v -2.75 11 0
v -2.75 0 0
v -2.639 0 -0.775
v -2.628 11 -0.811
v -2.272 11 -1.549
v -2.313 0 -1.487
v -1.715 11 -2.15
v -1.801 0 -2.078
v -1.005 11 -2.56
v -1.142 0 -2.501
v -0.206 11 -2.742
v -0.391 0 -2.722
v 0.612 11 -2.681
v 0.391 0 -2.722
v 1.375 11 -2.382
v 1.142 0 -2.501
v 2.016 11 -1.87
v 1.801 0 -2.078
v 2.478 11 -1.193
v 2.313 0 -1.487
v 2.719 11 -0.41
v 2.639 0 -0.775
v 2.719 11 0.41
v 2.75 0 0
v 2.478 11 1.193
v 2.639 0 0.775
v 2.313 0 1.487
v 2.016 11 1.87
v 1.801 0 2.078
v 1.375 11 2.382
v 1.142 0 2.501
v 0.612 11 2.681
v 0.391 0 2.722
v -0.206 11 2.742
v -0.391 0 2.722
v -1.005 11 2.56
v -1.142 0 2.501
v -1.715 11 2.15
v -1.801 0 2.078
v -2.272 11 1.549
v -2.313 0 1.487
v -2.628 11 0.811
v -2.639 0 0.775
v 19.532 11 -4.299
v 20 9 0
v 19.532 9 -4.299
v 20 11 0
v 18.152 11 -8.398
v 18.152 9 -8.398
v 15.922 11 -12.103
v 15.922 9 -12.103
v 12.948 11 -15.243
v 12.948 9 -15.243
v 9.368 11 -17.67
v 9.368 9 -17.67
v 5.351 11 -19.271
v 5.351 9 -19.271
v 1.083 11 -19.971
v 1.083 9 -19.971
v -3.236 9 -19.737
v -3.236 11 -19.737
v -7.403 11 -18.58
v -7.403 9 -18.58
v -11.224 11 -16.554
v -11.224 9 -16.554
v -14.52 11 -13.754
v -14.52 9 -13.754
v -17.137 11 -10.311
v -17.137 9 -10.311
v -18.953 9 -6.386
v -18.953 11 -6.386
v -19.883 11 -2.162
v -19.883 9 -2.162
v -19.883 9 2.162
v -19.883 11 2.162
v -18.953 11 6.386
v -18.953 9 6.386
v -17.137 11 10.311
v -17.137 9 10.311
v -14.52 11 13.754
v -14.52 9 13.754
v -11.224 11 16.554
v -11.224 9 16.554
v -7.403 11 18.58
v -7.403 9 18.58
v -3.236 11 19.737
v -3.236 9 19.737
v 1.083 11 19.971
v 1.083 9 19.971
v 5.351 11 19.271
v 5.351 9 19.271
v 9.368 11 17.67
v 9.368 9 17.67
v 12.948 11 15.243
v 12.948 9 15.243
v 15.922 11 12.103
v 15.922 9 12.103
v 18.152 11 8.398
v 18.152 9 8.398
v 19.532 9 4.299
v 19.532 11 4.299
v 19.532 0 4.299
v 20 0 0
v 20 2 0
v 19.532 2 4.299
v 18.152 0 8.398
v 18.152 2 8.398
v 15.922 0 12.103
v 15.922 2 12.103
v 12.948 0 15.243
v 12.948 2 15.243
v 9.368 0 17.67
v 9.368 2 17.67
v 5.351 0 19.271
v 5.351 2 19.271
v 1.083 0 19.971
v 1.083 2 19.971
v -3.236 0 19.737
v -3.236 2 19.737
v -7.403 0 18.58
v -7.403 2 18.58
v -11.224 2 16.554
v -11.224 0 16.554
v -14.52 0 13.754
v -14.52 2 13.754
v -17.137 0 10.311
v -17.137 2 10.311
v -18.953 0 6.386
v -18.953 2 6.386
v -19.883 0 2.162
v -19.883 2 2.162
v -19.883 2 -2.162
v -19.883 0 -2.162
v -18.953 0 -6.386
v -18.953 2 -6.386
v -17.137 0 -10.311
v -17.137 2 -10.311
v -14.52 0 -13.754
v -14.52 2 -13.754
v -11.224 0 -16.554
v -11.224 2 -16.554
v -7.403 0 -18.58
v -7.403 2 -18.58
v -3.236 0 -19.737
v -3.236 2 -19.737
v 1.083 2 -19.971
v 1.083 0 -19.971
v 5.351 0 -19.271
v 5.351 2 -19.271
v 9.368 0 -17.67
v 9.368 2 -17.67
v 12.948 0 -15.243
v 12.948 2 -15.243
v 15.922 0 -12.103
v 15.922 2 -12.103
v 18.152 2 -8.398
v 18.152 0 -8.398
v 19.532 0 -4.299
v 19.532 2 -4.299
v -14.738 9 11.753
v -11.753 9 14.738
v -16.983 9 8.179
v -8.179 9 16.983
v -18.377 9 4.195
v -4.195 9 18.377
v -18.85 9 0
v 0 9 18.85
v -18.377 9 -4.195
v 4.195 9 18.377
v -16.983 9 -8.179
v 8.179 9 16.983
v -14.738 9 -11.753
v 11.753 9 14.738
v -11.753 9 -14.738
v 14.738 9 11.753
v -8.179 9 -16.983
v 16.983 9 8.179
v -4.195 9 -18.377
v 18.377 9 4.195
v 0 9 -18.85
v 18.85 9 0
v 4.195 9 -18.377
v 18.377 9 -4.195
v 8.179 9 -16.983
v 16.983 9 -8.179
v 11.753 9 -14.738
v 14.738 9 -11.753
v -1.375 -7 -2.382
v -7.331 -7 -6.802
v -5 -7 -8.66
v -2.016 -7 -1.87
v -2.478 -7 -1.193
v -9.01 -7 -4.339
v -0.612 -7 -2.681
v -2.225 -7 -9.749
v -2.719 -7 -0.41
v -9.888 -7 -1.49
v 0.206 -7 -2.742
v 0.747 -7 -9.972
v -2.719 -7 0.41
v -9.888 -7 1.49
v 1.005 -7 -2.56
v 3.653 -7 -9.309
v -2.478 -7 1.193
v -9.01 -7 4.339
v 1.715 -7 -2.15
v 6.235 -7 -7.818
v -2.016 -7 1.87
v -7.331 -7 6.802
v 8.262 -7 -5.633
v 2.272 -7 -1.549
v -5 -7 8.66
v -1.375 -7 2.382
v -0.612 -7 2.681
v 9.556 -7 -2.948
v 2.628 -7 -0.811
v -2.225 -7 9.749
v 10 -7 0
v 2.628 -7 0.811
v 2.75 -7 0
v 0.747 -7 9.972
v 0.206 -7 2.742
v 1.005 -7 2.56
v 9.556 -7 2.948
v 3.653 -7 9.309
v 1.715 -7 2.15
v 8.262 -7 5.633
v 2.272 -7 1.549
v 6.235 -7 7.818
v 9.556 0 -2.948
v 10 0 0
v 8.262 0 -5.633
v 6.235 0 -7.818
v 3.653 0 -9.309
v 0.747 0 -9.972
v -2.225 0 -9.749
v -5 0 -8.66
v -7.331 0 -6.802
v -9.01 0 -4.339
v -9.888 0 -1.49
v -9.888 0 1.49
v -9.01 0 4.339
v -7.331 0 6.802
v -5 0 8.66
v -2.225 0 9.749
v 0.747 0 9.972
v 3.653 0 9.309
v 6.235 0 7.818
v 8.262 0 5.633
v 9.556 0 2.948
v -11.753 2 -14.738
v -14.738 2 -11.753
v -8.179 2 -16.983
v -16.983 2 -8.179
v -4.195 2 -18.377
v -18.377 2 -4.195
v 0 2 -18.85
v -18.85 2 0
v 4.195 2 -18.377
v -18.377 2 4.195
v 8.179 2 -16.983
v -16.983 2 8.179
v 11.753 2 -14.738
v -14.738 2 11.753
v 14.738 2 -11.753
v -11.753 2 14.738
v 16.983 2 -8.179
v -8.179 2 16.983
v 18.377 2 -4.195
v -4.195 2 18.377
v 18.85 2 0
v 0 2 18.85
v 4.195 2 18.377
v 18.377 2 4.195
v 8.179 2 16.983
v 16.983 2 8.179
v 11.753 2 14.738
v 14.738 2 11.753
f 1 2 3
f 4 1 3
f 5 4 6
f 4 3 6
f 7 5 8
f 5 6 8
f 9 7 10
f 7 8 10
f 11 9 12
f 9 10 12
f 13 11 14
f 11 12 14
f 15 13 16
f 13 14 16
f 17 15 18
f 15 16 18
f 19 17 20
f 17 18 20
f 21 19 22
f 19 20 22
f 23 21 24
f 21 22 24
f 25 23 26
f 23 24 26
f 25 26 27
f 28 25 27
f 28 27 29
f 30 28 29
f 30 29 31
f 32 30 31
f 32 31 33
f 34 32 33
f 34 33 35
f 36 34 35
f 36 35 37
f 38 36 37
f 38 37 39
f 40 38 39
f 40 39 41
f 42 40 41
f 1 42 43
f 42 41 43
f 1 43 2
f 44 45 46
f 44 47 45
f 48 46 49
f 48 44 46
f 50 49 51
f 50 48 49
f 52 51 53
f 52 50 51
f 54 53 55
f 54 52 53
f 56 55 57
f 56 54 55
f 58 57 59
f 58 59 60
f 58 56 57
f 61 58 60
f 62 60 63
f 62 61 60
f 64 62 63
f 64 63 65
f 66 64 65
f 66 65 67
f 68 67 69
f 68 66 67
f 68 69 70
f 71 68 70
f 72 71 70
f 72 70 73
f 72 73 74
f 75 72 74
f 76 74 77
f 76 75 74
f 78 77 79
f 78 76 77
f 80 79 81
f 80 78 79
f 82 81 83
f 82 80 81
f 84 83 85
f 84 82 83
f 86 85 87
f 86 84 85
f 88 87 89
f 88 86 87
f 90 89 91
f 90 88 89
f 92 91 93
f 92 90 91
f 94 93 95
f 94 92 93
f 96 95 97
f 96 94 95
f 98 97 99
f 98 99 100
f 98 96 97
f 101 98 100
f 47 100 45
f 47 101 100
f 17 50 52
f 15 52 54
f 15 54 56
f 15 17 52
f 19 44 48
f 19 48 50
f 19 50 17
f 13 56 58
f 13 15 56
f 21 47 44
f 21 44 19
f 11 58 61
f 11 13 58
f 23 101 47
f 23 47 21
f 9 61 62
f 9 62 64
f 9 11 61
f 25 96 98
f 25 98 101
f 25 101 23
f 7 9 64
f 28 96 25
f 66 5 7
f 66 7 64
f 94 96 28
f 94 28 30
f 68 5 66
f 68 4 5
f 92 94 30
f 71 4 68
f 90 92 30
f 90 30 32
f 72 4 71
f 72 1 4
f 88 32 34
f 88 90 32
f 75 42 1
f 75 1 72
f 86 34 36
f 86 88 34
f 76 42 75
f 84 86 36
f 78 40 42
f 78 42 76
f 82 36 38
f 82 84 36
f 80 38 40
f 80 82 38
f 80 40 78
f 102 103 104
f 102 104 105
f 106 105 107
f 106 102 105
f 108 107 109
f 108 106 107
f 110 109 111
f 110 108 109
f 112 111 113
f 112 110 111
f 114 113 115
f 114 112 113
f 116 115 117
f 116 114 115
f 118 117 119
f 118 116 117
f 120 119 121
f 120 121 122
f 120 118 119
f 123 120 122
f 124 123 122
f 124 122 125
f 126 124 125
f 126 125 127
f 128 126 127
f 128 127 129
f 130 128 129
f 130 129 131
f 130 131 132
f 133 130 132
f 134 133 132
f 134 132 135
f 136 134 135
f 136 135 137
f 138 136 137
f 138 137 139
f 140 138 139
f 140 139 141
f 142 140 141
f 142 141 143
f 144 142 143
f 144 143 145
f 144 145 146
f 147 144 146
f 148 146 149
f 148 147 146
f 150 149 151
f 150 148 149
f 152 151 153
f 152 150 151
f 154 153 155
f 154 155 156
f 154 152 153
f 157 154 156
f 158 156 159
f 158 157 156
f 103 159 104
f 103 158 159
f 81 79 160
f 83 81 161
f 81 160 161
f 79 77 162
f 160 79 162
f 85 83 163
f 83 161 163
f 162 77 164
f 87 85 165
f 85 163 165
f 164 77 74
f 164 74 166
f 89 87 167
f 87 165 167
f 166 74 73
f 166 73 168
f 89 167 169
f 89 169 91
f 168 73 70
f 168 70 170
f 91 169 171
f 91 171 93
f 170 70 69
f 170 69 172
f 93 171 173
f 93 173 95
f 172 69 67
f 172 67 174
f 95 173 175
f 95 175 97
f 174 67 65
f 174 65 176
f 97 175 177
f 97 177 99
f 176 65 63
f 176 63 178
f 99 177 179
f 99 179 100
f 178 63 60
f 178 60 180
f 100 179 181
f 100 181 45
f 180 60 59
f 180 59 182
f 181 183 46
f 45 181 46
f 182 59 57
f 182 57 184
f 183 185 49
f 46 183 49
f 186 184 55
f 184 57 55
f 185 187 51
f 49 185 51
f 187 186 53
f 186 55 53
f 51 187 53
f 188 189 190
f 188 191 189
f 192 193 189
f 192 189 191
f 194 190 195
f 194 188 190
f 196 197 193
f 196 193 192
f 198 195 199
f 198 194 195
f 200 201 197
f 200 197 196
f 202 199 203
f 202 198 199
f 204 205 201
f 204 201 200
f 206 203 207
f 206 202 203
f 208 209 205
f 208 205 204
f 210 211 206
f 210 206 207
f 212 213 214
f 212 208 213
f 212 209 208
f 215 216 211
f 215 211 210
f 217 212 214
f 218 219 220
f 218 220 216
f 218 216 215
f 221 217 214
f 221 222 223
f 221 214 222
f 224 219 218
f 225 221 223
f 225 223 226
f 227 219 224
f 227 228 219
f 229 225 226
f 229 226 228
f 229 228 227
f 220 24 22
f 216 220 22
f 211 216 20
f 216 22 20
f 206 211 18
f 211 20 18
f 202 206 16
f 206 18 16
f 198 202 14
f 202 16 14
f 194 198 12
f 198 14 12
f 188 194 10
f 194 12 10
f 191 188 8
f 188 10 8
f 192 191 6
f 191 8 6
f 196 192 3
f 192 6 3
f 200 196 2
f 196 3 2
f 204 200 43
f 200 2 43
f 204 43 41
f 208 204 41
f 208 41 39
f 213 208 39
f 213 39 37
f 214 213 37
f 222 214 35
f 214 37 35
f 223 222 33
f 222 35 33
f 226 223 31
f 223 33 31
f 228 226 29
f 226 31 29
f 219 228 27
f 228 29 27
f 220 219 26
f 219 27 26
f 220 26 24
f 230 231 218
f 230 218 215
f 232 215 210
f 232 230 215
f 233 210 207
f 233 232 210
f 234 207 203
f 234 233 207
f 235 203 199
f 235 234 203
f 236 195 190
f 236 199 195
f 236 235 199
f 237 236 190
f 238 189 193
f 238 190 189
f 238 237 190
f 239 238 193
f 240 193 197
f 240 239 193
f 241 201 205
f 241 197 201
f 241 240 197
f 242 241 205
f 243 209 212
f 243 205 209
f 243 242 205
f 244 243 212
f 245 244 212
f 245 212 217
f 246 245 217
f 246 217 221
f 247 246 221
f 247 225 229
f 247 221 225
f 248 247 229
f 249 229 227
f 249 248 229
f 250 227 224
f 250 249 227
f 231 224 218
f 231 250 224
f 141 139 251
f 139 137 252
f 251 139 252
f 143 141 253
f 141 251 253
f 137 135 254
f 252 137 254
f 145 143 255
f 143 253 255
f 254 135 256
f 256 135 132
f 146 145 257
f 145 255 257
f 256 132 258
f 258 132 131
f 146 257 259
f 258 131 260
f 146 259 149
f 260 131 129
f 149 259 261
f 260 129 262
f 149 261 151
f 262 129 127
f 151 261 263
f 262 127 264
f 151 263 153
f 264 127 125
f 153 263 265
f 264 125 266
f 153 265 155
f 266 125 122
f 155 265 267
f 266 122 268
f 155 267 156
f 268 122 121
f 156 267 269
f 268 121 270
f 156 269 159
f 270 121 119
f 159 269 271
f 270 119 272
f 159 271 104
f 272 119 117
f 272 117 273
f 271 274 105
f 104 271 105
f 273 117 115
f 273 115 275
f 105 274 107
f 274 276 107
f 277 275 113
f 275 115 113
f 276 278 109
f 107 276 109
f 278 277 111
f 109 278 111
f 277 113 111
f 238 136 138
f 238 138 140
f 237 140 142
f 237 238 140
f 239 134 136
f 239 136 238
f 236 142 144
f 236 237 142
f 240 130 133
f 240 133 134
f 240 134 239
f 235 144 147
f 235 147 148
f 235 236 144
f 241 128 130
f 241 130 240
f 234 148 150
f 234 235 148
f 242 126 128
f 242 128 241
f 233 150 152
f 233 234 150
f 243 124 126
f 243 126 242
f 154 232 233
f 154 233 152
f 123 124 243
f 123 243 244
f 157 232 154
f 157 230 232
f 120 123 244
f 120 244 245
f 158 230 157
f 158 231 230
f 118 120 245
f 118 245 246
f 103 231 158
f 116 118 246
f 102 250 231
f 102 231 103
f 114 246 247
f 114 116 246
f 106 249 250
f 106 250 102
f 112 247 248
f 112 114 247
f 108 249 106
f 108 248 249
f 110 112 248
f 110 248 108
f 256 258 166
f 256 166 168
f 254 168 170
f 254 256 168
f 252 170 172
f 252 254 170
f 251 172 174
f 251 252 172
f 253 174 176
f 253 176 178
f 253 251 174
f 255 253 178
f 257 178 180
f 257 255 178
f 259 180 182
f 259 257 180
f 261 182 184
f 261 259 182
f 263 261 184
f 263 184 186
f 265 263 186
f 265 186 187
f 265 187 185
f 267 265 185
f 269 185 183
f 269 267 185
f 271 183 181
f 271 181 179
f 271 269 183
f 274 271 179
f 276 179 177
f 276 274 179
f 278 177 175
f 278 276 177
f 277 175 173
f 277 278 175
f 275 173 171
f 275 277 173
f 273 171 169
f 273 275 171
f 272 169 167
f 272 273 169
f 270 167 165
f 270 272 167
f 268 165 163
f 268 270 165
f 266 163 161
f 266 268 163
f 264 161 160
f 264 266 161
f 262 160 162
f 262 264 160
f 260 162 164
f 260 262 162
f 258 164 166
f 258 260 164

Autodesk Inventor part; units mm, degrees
ref_plane "YZ Plane" through (0, 0, 0) normal (1, 0, 0) x (0, 1, 0)
ref_plane "XZ Plane" through (0, 0, 0) normal (0, 1, 0) x (-1, 0, 0)
ref_plane "XY Plane" through (0, 0, 0) normal (0, 0, 1) x (1, 0, 0)
sketch "Sketch1" plane through (0, 0, 0) normal (0, 1, 0) x (-1, 0, 0)
  circle A0 centre (0, 0) radius 18.85
  circle A1 centre (0, 0) radius 2.75
  dimension "d0" = 37.7
  dimension "d1" = 5.5
extrude "Extrusion1" add sketch "Sketch1" along normal blind 11
sketch "Sketch2" plane through (0, 11, 0) normal (0, 1, 0) x (1, 0, 0)
  circle A0 centre (0, 0) radius 20
  circle A1 centre (0, 0) radius 18.85
  dimension "d4" = 40
extrude "Extrusion2" add sketch "Sketch2" against normal blind 2
sketch "Sketch3" plane through (0, 0, 0) normal (0, -1, 0) x (1, 0, 0)
  circle A0 centre (0, 0) radius 20
  circle A1 centre (0, 0) radius 18.85
  dimension "d7" = 40
  dimension "d8" = 37.7
extrude "Extrusion3" add sketch "Sketch3" against normal blind 2
sketch "Sketch4" plane through (0, 0, 0) normal (0, -1, 0) x (1, 0, 0)
  circle A0 centre (0, 0) radius 10
  circle A1 centre (0, 0) radius 2.75
  dimension "d11" = 20
  dimension "d12" = 5.5
extrude "Extrusion4" add sketch "Sketch4" along normal blind 7
